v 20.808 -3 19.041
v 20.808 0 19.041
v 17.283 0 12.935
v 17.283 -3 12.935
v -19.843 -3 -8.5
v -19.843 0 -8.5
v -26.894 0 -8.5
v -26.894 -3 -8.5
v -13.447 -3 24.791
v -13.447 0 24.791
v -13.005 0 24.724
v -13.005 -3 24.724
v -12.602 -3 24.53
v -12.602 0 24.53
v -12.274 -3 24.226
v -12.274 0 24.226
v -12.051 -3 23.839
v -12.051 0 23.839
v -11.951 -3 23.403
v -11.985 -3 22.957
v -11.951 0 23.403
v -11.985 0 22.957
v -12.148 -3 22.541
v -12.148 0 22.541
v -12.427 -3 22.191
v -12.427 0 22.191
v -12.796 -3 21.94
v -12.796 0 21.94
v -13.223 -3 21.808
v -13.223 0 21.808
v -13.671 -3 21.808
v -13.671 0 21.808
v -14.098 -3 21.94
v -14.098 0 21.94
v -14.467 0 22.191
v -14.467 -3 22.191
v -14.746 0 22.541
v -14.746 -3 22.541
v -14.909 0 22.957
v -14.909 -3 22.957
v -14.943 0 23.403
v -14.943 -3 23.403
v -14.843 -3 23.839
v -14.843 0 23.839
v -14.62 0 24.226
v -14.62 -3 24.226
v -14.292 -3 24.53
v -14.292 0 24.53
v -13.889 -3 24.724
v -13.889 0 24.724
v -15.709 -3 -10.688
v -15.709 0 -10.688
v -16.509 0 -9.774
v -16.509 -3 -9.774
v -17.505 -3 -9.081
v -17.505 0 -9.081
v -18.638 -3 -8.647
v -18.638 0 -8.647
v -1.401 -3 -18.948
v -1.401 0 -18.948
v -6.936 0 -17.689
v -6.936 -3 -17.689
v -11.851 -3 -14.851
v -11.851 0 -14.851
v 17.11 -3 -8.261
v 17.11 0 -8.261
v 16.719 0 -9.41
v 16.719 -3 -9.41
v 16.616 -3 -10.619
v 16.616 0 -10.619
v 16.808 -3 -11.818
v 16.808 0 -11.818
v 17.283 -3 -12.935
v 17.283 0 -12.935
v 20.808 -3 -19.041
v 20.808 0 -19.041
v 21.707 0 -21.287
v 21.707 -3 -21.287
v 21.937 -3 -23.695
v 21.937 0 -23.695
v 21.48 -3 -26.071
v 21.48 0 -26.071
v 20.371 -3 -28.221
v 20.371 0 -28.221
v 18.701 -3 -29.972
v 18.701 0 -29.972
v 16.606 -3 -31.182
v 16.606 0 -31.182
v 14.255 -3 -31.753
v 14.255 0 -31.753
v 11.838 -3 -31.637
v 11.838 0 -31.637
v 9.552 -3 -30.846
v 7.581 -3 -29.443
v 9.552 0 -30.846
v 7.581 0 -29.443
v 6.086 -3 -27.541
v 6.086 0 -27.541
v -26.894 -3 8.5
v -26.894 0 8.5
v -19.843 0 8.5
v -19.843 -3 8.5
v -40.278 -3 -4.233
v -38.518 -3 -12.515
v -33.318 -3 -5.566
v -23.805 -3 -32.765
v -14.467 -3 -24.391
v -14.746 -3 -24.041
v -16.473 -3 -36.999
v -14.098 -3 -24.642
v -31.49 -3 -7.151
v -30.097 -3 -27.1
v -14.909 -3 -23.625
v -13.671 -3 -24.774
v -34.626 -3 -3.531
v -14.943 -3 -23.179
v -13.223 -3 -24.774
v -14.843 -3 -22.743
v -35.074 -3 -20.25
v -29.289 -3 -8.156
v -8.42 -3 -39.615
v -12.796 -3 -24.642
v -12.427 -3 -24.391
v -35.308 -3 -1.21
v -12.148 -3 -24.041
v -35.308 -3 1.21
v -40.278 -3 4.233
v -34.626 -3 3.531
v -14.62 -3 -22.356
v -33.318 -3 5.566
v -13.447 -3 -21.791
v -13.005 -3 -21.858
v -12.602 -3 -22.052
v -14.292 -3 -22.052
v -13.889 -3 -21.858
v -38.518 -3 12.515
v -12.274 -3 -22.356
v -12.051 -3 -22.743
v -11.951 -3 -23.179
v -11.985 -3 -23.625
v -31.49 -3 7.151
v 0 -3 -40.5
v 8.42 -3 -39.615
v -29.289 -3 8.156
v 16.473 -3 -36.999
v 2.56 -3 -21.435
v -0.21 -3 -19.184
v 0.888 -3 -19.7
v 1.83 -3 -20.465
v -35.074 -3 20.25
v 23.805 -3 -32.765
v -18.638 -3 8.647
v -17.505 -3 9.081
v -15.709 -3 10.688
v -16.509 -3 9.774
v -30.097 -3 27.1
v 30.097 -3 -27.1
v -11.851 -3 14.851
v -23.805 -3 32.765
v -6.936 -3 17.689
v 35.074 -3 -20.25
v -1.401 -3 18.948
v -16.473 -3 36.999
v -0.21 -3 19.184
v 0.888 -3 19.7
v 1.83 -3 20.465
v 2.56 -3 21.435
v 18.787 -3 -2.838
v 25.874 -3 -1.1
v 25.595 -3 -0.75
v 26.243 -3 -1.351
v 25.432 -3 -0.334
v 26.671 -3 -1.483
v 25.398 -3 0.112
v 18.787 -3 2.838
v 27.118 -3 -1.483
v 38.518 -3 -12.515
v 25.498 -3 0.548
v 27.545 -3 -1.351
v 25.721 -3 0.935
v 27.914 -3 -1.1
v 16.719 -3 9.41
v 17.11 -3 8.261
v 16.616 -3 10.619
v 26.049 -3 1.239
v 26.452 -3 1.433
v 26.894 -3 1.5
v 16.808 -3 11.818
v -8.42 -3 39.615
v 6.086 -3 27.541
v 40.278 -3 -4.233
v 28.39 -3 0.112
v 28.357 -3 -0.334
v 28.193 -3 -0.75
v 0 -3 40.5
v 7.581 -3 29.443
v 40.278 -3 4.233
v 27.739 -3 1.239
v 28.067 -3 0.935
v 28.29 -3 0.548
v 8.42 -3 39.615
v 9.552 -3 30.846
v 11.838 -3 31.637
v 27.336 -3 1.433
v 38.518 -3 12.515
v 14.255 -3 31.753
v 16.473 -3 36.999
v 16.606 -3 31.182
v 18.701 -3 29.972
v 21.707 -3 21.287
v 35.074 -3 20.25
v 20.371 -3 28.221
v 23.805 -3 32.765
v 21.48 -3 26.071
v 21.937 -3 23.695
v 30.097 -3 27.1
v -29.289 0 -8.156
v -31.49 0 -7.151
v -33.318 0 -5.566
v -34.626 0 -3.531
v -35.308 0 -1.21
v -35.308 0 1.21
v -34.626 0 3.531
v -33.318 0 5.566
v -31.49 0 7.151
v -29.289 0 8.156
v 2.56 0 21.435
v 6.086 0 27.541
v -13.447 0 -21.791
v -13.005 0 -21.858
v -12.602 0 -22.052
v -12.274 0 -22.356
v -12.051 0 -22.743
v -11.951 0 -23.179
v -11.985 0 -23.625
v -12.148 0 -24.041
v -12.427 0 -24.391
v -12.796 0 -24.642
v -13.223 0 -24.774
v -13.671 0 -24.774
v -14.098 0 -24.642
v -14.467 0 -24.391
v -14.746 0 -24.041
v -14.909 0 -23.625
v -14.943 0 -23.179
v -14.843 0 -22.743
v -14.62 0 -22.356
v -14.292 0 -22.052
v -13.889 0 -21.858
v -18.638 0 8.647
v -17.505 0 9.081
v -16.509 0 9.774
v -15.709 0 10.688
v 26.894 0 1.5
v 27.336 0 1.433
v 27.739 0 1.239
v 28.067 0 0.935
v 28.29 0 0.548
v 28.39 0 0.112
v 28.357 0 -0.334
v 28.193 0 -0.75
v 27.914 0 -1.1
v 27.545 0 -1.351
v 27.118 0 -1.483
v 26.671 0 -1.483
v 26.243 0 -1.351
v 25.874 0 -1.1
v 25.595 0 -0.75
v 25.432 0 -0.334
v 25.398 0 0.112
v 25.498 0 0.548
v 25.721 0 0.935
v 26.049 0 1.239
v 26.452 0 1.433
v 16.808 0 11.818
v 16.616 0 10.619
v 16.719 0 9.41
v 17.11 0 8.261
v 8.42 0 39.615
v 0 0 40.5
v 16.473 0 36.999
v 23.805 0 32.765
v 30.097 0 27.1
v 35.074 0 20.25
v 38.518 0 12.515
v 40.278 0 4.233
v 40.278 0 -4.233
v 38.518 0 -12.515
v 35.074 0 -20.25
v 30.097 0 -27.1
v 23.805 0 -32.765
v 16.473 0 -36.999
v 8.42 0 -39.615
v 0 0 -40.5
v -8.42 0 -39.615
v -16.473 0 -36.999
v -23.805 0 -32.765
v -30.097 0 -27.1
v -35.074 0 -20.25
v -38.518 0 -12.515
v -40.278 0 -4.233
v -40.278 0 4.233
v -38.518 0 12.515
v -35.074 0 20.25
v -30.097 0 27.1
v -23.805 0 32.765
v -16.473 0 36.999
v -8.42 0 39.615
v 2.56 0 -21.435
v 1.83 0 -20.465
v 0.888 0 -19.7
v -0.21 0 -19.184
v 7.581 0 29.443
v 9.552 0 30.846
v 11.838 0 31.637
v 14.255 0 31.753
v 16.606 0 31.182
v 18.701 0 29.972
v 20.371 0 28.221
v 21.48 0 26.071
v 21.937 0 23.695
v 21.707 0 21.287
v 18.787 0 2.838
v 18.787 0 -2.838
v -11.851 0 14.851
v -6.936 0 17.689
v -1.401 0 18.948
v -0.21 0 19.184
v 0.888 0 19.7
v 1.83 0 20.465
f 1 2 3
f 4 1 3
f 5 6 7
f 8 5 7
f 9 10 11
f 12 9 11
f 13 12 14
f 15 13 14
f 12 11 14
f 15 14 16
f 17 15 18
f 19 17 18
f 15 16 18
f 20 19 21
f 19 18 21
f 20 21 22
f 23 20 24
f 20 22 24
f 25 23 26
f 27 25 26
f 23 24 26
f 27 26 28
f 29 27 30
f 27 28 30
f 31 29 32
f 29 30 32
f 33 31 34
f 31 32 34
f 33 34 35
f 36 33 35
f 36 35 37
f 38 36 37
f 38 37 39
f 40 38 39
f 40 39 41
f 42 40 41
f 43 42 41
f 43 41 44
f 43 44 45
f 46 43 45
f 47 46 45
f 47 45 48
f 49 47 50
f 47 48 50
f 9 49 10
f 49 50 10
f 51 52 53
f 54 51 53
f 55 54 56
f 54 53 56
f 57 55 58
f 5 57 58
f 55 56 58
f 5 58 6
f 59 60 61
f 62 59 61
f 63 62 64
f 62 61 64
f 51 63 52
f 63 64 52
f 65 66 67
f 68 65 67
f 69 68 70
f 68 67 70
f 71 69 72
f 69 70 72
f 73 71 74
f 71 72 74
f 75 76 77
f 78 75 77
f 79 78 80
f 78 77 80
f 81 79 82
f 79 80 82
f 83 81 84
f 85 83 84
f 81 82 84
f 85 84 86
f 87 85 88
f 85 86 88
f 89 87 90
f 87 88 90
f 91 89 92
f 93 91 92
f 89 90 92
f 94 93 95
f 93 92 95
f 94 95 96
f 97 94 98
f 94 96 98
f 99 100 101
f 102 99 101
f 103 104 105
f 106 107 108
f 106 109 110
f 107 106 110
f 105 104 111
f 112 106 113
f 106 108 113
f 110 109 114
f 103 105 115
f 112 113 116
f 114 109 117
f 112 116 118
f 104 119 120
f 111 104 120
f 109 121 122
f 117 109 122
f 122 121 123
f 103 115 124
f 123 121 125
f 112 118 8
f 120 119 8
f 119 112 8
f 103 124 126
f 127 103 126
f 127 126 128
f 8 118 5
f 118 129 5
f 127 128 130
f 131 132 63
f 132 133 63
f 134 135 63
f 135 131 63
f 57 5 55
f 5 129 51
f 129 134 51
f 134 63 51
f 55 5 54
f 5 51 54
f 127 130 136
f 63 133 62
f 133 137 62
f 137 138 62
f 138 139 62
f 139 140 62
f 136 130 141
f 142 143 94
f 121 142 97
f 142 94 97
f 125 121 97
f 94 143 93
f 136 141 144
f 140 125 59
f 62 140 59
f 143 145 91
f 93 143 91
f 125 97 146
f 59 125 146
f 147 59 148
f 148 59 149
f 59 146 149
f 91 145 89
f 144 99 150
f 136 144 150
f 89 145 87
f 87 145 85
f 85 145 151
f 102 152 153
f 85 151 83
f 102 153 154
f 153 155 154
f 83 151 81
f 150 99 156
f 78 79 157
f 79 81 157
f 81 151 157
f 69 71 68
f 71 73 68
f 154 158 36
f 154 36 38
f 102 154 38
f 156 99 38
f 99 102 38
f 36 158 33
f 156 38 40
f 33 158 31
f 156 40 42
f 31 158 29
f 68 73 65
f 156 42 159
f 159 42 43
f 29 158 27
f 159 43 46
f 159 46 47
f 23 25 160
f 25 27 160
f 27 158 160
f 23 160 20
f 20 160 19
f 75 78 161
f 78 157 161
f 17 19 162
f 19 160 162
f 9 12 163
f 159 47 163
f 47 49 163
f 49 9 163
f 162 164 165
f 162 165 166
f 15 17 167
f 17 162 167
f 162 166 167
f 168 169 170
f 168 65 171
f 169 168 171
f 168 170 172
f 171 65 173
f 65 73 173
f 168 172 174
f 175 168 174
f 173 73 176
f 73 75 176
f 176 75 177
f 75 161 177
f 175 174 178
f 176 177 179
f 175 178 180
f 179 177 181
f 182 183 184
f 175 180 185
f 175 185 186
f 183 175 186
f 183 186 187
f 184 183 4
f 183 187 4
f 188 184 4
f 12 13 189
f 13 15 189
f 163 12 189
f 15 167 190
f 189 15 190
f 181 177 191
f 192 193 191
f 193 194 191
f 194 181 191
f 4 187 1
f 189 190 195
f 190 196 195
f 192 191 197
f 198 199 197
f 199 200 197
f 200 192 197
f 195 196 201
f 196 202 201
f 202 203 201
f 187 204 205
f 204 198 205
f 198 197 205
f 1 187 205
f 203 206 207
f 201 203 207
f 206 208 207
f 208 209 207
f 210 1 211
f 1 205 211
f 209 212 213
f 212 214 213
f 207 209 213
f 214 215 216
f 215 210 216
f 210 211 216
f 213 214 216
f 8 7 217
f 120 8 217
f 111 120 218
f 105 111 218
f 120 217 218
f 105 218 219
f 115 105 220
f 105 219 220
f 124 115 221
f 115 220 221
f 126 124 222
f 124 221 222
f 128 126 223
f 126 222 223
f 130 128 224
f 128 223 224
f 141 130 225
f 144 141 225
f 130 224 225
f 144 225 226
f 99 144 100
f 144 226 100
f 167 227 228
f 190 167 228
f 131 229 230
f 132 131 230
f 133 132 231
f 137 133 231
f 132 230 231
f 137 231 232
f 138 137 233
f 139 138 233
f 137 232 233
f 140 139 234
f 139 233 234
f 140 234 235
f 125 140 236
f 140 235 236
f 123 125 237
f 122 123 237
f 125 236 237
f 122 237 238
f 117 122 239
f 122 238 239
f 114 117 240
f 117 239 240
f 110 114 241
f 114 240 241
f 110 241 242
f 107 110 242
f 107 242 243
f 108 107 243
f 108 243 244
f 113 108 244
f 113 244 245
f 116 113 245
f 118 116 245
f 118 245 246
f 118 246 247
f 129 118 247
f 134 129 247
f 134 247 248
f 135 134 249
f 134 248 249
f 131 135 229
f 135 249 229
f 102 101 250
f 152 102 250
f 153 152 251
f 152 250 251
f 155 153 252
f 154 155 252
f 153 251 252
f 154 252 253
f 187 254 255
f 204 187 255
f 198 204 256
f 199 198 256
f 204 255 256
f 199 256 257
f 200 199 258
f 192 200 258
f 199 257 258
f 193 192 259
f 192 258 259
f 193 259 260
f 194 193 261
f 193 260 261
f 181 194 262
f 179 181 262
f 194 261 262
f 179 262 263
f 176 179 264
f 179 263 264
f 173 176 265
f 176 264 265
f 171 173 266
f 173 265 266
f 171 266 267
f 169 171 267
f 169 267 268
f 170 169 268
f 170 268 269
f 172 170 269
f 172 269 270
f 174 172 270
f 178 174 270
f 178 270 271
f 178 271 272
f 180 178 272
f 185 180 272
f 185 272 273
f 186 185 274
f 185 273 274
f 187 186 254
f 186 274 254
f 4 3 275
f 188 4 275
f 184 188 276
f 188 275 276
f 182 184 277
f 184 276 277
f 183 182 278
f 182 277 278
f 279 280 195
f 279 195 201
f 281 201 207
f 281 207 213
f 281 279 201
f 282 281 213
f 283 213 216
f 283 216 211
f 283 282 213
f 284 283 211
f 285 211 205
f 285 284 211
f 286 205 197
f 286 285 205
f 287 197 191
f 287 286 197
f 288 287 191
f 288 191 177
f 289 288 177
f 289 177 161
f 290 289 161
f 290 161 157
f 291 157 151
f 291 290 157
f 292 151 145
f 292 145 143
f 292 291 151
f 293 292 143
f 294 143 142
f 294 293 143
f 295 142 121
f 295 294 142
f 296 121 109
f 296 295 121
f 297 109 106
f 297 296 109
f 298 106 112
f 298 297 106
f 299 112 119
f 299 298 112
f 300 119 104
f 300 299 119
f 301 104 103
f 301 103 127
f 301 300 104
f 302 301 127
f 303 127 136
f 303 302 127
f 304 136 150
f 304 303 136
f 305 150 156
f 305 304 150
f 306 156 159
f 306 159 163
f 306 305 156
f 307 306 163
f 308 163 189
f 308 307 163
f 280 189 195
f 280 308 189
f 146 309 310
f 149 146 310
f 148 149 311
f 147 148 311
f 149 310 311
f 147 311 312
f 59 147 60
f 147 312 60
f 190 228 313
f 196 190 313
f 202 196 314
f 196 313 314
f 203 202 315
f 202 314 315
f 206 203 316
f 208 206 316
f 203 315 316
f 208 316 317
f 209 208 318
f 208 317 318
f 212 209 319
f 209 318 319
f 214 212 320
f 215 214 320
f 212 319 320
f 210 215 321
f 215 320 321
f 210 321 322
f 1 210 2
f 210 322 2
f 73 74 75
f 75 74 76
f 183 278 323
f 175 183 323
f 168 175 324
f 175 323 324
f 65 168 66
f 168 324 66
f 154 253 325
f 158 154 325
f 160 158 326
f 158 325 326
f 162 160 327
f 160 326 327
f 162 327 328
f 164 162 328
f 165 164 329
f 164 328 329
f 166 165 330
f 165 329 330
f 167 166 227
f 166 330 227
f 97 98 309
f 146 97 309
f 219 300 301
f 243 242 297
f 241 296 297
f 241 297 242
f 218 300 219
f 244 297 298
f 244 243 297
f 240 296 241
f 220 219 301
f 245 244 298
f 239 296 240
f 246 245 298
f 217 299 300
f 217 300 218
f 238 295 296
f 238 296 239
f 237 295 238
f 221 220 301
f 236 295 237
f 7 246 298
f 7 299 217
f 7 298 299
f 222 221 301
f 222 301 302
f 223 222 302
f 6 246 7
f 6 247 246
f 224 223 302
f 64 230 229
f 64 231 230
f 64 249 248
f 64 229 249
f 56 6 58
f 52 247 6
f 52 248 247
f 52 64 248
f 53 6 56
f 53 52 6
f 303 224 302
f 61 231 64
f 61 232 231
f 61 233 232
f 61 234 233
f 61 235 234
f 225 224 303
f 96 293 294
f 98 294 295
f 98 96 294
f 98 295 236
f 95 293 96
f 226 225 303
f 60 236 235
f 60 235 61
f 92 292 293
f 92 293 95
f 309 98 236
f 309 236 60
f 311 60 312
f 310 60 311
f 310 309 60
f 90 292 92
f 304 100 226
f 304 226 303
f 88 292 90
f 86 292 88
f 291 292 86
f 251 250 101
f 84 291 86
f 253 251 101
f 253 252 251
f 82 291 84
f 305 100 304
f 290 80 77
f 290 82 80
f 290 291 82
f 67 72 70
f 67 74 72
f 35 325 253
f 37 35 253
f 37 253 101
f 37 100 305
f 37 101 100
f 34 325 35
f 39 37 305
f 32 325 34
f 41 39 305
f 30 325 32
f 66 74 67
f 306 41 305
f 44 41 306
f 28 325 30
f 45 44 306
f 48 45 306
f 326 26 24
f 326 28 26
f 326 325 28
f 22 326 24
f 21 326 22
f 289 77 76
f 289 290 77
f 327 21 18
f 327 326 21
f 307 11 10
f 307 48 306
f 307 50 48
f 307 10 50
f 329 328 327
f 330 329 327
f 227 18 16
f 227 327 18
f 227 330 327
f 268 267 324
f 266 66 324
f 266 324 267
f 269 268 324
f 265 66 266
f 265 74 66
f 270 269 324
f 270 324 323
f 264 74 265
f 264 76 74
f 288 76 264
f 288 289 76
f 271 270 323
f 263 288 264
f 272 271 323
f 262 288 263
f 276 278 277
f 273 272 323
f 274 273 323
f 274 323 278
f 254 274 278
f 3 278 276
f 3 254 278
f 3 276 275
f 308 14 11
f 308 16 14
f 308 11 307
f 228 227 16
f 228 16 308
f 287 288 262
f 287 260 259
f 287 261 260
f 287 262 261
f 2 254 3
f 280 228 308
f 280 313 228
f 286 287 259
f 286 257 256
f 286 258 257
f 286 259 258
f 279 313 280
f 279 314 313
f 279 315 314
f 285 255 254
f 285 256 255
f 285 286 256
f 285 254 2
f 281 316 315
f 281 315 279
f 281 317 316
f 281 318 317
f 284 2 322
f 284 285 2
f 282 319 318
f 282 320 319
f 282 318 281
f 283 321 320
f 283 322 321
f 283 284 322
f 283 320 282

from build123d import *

# Parameters (mm, degrees)
SKETCH1_R           = 40.5
SKETCH1_R_2         = 1.5
BOSS_EXTRUDE1_DEPTH = 3


with BuildPart() as part:
    # Sketch1 → Boss-Extrude1 (new body)
    with BuildSketch(Plane(origin=(0, 0, 0), x_dir=(1, 0, 0), z_dir=(0, 1, 0))):
        with Locations(Location((0, 0, 0), (0, 0, 270))):
            Circle(SKETCH1_R)
        with Locations(Location((-13.447058678, 23.290988922, 0), (0, 0, 270))):
            Circle(SKETCH1_R_2, mode=Mode.SUBTRACT)
        with Locations(Location((26.894117425, -4e-08, 0), (0, 0, 270))):
            Circle(SKETCH1_R_2, mode=Mode.SUBTRACT)
        with Locations(Location((-13.447058747, -23.290988882, 0), (0, 0, 270))):
            Circle(SKETCH1_R_2, mode=Mode.SUBTRACT)
        with BuildLine():
            Line((6.085843699, 27.540990494), (2.560351484, 21.434658856))
            ThreePointArc((2.560351484, 21.434658856), (0.888284255, 19.699718697), (-1.401072298, 18.948271594))
            ThreePointArc((-1.401072298, 18.948271594), (-9.5, 16.454482672), (-15.709148409, 10.6875))
            ThreePointArc((-15.709148409, 10.6875), (-17.504598966, 9.080582618), (-19.843134833, 8.5))
            Line((-19.843134833, 8.5), (-26.894119263, 8.5))
            ThreePointArc((-26.894119263, 8.5), (-35.394119263, 0), (-26.894119263, -8.5))
            Line((-26.894119263, -8.5), (-19.843134833, -8.5))
            ThreePointArc((-19.843134833, -8.5), (-17.504598966, -9.080582618), (-15.709148409, -10.6875))
            ThreePointArc((-15.709148409, -10.6875), (-9.5, -16.454482672), (-1.401072298, -18.948271594))
            ThreePointArc((-1.401072298, -18.948271594), (0.888284255, -19.699718697), (2.560351484, -21.434658856))
            Line((2.560351484, -21.434658856), (6.085843699, -27.540990494))
            ThreePointArc((6.085843699, -27.540990494), (17.697059631, -30.652206426), (20.808275564, -19.040990494))
            Line((20.808275564, -19.040990494), (17.282783349, -12.934658856))
            ThreePointArc((17.282783349, -12.934658856), (16.616314711, -10.619136079), (17.110220708, -8.260771594))
            ThreePointArc((17.110220708, -8.260771594), (19, 0), (17.110220708, 8.260771594))
            ThreePointArc((17.110220708, 8.260771594), (16.616314711, 10.619136079), (17.282783349, 12.934658856))
            Line((17.282783349, 12.934658856), (20.808275564, 19.040990494))
            ThreePointArc((20.808275564, 19.040990494), (17.697059631, 30.652206426), (6.085843699, 27.540990494))
        make_face(mode=Mode.SUBTRACT)
    extrude(amount=-BOSS_EXTRUDE1_DEPTH)


solid = part.part
